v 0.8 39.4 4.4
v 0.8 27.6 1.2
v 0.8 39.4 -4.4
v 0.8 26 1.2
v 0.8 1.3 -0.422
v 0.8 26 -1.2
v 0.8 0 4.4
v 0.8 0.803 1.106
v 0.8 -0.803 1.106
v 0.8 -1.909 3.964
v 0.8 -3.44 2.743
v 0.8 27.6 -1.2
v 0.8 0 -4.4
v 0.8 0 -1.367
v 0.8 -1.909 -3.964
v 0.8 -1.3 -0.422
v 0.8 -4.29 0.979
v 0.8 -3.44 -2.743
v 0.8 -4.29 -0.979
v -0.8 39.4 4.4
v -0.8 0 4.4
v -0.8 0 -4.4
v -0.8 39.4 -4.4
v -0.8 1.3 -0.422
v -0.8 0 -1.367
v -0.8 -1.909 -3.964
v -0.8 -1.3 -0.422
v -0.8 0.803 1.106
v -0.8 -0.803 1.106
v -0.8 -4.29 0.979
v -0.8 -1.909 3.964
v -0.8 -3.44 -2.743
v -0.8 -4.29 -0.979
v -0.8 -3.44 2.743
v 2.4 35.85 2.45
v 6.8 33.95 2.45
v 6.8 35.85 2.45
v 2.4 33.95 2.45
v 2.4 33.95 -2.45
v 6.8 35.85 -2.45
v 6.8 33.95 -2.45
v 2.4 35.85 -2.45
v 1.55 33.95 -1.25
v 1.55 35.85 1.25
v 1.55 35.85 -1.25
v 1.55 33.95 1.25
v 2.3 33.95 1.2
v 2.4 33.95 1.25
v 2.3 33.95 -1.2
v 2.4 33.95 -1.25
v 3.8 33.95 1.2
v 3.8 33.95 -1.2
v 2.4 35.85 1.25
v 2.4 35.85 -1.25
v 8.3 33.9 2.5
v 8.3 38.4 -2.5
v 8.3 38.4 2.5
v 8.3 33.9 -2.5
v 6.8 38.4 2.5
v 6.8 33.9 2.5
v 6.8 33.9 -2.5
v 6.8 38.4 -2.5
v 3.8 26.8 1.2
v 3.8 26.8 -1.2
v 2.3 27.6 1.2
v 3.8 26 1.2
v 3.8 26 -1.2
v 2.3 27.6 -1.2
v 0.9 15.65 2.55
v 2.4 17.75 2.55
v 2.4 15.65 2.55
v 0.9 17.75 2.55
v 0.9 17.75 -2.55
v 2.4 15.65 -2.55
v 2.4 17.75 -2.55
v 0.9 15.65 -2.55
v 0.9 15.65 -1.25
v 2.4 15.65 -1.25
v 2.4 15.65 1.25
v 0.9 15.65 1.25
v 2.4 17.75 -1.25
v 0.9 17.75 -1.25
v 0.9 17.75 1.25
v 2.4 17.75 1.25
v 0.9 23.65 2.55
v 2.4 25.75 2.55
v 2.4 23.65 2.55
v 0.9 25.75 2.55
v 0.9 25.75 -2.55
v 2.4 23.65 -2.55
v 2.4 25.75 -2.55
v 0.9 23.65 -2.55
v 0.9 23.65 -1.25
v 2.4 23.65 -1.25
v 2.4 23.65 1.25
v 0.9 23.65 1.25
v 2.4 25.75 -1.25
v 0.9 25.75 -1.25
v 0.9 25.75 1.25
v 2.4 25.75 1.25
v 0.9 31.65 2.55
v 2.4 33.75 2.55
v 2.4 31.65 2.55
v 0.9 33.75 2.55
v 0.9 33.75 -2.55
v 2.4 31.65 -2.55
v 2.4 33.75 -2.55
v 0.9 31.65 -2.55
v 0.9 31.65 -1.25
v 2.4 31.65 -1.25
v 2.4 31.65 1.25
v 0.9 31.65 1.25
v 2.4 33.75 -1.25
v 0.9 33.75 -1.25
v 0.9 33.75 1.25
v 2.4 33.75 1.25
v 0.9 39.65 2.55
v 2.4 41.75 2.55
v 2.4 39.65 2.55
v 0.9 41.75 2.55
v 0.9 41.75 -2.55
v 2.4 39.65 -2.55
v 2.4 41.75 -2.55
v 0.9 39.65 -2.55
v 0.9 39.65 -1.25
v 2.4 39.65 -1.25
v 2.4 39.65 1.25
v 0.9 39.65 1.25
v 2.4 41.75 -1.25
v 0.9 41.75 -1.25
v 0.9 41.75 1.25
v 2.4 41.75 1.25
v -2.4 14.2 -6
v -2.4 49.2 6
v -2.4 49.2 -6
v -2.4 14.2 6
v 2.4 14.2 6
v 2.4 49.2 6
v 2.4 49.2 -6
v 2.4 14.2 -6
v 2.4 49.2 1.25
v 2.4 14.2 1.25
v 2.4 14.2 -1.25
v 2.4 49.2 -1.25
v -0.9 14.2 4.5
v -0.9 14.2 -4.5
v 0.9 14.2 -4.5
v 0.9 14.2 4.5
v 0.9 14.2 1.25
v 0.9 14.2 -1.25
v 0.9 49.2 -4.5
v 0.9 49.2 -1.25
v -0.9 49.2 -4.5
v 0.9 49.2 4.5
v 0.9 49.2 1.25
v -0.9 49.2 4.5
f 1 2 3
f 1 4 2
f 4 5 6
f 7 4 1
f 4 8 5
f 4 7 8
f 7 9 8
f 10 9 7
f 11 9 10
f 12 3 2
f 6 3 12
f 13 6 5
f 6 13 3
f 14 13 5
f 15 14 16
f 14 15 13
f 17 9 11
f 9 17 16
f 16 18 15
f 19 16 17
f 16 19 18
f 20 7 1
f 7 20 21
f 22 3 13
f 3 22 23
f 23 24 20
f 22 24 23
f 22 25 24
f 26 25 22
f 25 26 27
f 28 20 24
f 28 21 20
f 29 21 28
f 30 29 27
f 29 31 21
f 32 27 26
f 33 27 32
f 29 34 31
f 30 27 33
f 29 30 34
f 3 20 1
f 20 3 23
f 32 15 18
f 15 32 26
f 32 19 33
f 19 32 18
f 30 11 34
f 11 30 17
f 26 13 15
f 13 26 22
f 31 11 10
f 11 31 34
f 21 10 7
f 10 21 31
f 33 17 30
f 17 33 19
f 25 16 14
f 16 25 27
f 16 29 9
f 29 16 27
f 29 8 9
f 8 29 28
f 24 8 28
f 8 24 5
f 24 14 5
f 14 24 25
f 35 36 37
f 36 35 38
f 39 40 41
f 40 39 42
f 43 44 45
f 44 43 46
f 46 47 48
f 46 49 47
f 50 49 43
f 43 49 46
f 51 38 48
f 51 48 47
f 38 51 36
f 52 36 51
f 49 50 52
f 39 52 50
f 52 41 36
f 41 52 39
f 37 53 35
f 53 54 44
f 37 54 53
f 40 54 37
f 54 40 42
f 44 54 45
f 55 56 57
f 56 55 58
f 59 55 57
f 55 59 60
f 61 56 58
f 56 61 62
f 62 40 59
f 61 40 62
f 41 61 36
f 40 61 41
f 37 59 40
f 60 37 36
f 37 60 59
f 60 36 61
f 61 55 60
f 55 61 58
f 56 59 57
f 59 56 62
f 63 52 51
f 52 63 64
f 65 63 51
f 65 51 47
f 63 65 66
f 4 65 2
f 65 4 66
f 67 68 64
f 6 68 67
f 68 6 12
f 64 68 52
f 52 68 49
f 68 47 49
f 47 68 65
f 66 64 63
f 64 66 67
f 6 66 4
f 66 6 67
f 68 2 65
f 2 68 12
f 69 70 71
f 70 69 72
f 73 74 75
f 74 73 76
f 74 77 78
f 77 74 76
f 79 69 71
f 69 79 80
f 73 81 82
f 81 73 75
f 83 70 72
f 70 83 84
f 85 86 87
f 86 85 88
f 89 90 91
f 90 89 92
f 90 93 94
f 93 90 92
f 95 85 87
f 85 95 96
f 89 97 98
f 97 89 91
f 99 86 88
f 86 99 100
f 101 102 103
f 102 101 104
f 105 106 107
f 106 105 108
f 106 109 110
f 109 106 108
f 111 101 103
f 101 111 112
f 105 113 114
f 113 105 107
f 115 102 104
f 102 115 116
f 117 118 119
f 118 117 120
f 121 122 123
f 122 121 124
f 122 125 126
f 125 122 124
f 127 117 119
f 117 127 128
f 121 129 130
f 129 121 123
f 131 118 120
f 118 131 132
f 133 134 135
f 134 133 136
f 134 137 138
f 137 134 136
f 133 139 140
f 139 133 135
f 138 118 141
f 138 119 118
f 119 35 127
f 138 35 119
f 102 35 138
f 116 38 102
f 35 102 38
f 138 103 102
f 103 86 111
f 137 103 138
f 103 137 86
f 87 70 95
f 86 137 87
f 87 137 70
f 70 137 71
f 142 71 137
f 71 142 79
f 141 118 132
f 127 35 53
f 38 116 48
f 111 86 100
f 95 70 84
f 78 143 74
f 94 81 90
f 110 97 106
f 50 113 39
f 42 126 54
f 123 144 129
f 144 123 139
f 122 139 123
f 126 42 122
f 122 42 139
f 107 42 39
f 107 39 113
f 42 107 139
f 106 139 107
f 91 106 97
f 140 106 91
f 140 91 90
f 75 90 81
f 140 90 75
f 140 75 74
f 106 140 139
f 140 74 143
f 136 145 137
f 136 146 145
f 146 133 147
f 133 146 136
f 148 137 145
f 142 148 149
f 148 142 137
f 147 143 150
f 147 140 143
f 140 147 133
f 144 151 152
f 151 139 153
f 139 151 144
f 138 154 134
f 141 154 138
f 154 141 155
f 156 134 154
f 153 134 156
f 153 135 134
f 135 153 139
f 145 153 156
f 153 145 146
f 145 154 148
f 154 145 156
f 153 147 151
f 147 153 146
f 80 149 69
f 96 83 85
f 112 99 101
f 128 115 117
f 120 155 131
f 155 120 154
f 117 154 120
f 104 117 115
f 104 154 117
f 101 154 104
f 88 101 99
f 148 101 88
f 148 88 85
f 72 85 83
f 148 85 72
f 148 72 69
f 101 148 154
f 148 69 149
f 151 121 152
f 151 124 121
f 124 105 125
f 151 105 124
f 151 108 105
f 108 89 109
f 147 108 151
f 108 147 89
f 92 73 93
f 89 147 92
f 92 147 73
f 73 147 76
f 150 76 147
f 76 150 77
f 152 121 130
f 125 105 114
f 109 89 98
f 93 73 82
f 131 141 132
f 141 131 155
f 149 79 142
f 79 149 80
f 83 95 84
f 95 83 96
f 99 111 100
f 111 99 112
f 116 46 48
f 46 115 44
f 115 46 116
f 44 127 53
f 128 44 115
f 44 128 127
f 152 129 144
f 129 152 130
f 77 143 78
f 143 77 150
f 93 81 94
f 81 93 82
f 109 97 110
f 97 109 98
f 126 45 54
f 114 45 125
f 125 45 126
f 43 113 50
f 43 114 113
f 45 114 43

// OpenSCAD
// file: paddle_bar.scad
include <parameters.scad>;

module paddle_bar(){
	cylinder(h= paddle_bar_h,r=paddle_bar_r);
}

paddle_bar();
// file: paddle_upper.scad
include <paddle_bar.scad>;

module paddle_upper(){
	notches = round((paddle_upper_l-hook_t-shell*2)/upper_length_resolution-0.5);

	difference(){
		cube([paddle_upper_t, paddle_upper_l, paddle_upper_w], center = true);
		cube([paddle_upper_t-shell*2, paddle_upper_l+1, paddle_upper_w-shell*2], center = true);
		translate([-paddle_upper_t/2,0,0])
			cube([paddle_upper_t, paddle_upper_l+1, groove], center = true);
		translate([-paddle_upper_t/2,+paddle_upper_l/2-hook_t/2-shell,0])
			for(i = [0:notches]){
				translate([0,-upper_length_resolution*i,0])
					cube([paddle_upper_t+1, hook_t+hook_gap, hook_w+hook_gap], center = true);
			}
	}
}

paddle_upper();
// file: parameters.scad
//All parameters

link_gear_r = 25;
link_gear_h = 10;

paddle_gear_r = 20;
paddle_gear_h = 10;

paddle_shaft_r = 5;
paddle_shaft_h = 400;

upper_length_resolution = 8;
hook_w = 5;
hook_t = 2;
hook_gap = 0.1;
shell = 1.5;
groove = 2.5;

paddle_upper_l = 35;
paddle_upper_t = shell*3.2;
paddle_upper_w = 12;

slide_gap = 0.1;
forearm_w = paddle_upper_w-shell*2-slide_gap*2;
wrist_joint_outer = forearm_w/2;
wrist_joint_inner = wrist_joint_outer/3;

forearm_t = paddle_upper_t-shell*2-slide_gap*2;
forearm_l = paddle_upper_l+wrist_joint_outer;

bolt_r = wrist_joint_inner-slide_gap;
bolt_h = forearm_t*2+slide_gap;
bolt_groove = bolt_r*0.4;

head_hook = bolt_groove/2-slide_gap*2;
head_r = bolt_r+head_hook;

clip_l = shell*4+hook_t+slide_gap;
clip_h = shell*2+forearm_t;

thumb_hook_h = shell*2;
thumb_hook_t = shell;
thumb_hook_l = shell*3;
hook_h = shell*2+thumb_hook_h;

pos1 = 1;
pos2 = 0;
wrist_angle = 0;
paddle_upper_declination = 180;
declination_offset = (paddle_upper_w)/(paddle_upper_l*2)*(180/3.1415);

paddle_bar_h = 100;
paddle_bar_r = 10;

paddle_upper_declination = 210;
paddle_gear_elivation = 45;
// main file
include <parameters.scad>;
use <paddle_upper.scad>;

module bolt(){
	module slug(){
		rotate([0,90,0])
			cylinder(h = bolt_h, r = bolt_r, center = true);
		translate([bolt_h/2,0,0])
			difference(){
				sphere(r = head_r, center = true);
				translate([-head_r,0,0])
					cube([head_r*2,head_r*2,head_r*2], center = true);
				translate([0,head_r+bolt_r,0])
					cube([head_r*2,head_r*2,head_r*2], center = true);
				translate([0,-head_r-bolt_r,0])
					cube([head_r*2,head_r*2,head_r*2], center = true);
		}
	}
	difference(){
		slug();
		translate([bolt_h*0.5,0,0])
				cube([bolt_h,bolt_r*2+0.1,bolt_groove],center = true);
	}
}

module clip(){
	cube([clip_h ,forearm_t,groove-slide_gap], center = true);
	translate([clip_h/2-shell/2,-clip_l/2,0]){
		cube([shell,clip_l,groove-slide_gap], center = true);
		translate([hook_h/2-shell,-clip_l/2,0]){
			cube([hook_h,hook_t-slide_gap,hook_w-slide_gap],center = true);
			translate([hook_h/2,-thumb_hook_l/2+hook_t/2,0])
				cube([thumb_hook_t,thumb_hook_l,hook_w],center = true);
		}
	}
}

module forearm(bolt){
	module slug(){
		cube([forearm_t, forearm_l, forearm_w], center = true);
		translate([0,forearm_l/2,0]){
			rotate([0,90,0])
				cylinder(h = forearm_t, r = wrist_joint_outer, center = true);
		}
	}
	if(bolt){
		slug();
		translate([0,forearm_l/2,0]){
			translate([bolt_h/4,0,0]){
				bolt();
			}
		}
	}else{
		difference(){
			slug();
			translate([0,forearm_l/2,0]){
				translate([bolt_h/4,0,0]){
					bolt();
				}
			}
		}
		
	}

	translate([-forearm_t/2+clip_h/2,-forearm_l/2+clip_l+thumb_hook_l])
		clip();
}

module lower_forearm(pos2){
	translate([0,forearm_l/2,0]){
		mirror([0,1,0]){
			forearm(false);
			mirror([1,0,0])
					translate([0,-upper_length_resolution/2-upper_length_resolution*pos2,0])
						paddle_upper();
		}
	}
}

lower_forearm(1);
//forearm(true);
